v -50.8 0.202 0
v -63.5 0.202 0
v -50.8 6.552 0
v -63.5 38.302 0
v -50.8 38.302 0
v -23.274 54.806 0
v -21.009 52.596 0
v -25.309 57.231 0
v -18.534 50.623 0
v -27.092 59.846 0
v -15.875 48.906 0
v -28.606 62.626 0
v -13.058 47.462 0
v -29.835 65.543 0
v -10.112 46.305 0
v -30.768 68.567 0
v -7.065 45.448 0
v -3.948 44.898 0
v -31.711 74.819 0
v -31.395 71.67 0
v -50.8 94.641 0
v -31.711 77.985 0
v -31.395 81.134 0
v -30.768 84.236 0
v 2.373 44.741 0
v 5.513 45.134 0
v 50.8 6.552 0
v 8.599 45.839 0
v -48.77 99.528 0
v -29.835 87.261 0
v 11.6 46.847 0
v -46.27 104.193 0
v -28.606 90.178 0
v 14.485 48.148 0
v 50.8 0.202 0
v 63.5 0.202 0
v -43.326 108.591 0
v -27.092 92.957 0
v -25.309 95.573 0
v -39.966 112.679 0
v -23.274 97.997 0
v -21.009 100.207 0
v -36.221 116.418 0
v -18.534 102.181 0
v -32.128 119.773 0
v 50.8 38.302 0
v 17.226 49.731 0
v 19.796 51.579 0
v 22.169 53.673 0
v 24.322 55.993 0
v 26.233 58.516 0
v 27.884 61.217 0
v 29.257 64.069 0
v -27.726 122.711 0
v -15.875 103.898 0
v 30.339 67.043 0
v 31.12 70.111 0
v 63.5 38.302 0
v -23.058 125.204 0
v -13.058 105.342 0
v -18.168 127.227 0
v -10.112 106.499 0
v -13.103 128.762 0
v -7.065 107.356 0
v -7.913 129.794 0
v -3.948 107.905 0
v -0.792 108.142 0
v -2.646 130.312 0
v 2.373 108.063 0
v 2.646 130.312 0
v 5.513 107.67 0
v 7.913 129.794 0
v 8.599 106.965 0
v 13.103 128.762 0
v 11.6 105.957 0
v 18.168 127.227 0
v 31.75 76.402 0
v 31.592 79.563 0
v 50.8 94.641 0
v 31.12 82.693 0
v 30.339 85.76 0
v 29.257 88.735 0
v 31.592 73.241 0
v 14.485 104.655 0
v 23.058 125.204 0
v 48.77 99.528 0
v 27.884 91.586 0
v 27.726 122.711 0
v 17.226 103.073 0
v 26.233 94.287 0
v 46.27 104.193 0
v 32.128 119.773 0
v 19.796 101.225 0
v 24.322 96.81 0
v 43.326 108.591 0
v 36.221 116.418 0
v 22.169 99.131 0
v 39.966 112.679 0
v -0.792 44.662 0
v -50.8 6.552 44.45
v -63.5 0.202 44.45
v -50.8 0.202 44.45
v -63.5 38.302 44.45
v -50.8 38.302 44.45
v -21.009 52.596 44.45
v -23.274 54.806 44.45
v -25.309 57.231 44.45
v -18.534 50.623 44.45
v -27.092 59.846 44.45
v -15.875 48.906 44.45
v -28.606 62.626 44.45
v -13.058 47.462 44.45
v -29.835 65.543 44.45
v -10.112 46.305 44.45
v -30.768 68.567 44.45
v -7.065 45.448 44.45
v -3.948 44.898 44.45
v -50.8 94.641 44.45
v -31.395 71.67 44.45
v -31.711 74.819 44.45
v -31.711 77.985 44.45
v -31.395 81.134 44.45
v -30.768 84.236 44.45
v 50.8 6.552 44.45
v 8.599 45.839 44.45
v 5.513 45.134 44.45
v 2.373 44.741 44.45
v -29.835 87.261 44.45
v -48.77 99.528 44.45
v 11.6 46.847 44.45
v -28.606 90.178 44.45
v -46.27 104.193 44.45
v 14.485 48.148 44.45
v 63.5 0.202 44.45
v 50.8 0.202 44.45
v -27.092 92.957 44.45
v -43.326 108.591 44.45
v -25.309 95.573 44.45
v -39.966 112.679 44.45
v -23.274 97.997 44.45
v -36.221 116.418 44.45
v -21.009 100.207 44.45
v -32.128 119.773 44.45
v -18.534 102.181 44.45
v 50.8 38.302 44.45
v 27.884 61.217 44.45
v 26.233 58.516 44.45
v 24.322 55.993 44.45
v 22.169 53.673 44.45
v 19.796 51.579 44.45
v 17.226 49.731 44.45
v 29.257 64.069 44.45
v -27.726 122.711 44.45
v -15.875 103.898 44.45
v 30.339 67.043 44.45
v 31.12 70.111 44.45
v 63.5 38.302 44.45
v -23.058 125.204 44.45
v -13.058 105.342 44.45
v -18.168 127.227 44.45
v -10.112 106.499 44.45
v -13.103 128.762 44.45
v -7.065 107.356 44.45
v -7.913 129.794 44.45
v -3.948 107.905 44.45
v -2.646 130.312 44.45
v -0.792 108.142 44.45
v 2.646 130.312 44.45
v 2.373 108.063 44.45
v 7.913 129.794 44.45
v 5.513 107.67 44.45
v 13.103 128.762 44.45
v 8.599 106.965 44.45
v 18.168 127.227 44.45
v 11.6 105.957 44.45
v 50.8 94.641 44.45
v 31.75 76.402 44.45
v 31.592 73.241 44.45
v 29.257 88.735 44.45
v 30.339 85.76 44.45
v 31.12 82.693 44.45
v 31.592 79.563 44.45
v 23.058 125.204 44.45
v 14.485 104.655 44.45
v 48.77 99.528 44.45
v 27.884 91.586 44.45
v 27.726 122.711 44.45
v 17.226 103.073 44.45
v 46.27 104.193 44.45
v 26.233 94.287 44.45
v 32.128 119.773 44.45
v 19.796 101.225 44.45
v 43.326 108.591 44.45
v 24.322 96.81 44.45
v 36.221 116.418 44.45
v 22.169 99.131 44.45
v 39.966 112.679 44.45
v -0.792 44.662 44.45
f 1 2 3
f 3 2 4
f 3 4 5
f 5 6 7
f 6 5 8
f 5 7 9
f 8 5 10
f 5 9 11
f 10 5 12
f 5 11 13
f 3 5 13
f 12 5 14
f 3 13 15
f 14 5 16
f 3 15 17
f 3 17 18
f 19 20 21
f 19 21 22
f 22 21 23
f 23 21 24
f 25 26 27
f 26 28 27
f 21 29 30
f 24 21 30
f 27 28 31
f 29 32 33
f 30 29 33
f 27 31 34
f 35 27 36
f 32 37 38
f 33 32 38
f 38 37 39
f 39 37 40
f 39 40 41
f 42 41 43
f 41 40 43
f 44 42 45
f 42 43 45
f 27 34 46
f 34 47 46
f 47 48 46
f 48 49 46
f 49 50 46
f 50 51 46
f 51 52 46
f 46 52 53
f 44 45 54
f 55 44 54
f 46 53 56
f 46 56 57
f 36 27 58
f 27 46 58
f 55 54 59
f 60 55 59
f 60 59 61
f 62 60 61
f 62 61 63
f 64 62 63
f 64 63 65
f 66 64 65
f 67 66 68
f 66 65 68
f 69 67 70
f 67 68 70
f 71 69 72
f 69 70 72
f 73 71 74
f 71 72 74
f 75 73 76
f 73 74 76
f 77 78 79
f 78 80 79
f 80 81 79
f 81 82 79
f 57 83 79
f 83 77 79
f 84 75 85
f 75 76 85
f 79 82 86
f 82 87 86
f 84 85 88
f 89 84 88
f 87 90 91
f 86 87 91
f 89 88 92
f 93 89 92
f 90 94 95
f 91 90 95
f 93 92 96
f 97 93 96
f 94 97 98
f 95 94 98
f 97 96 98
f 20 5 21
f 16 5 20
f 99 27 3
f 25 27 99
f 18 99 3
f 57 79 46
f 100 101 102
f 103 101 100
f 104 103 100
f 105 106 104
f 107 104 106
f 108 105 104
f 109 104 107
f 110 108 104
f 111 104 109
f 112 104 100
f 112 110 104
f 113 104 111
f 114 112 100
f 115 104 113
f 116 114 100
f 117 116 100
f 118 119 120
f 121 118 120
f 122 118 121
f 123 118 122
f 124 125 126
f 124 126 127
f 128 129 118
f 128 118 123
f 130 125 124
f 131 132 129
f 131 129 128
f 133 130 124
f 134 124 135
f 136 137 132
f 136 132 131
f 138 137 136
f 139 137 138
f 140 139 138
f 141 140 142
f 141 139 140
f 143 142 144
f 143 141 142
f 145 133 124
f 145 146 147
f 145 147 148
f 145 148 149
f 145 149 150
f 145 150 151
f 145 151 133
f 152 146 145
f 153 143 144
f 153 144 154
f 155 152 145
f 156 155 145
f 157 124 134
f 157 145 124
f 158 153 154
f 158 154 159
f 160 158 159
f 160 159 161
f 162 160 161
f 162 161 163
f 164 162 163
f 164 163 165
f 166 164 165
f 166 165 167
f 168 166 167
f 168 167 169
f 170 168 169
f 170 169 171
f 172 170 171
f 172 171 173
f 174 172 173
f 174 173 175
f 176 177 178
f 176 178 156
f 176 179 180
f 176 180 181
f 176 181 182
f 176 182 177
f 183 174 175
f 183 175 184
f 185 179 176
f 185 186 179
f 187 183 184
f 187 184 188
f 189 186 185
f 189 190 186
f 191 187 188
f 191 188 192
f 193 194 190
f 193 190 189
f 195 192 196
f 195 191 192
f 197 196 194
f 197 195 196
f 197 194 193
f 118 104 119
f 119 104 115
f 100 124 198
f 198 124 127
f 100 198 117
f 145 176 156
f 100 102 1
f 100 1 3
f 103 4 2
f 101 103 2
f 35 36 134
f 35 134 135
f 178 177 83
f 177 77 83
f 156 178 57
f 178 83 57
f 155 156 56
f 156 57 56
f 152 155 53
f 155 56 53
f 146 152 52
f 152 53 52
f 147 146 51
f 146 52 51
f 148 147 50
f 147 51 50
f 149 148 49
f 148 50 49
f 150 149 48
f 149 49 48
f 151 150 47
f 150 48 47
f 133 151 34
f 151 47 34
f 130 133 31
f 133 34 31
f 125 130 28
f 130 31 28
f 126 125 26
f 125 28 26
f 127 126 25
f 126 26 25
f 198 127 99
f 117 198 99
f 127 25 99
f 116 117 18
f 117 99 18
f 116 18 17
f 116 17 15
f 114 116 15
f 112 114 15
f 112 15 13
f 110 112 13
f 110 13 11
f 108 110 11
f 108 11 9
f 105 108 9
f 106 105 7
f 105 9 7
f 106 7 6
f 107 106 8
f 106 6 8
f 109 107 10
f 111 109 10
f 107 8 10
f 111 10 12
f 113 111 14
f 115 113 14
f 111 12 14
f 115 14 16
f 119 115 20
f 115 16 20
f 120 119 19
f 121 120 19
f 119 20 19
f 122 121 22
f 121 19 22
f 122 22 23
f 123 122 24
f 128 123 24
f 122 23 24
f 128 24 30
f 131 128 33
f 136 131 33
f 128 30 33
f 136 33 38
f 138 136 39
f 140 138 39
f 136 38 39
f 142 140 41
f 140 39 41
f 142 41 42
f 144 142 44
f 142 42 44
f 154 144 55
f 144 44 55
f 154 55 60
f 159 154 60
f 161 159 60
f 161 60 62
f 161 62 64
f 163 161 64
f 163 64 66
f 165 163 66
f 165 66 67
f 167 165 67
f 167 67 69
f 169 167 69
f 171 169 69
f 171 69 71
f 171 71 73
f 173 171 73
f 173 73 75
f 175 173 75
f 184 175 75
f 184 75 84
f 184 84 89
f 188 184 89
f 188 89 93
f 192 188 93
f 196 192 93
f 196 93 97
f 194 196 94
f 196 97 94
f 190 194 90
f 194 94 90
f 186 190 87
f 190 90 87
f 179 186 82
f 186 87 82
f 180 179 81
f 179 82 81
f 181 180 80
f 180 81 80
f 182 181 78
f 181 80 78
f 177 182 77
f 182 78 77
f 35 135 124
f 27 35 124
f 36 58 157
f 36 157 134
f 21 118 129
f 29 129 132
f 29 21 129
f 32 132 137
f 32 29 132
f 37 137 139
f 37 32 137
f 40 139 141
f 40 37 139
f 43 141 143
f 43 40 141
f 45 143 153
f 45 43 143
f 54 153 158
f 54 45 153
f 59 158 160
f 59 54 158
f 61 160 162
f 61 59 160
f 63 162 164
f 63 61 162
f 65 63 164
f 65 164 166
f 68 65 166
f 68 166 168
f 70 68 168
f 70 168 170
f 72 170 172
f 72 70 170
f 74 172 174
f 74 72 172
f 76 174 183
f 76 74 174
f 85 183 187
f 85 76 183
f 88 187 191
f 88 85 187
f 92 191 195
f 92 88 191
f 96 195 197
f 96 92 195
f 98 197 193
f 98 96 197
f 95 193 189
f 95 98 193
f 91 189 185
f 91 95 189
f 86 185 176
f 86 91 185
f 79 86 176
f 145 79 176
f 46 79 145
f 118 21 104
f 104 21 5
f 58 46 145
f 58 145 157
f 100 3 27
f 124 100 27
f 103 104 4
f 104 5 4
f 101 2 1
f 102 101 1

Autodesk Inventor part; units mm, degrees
ref_plane "YZ Plane" through (0, 0, 0) normal (1, 0, 0) x (0, 1, 0)
ref_plane "XZ Plane" through (0, 0, 0) normal (0, 1, 0) x (-1, 0, 0)
ref_plane "XY Plane" through (0, 0, 0) normal (0, 0, 1) x (1, 0, 0)
sketch "Sketch1" plane through (0, 0, 0) normal (0, 0, 1) x (1, 0, 0)
  line L0 (0, 0) -> (0, 152.8038)
  line L1 (-50.8, 94.6409) -> (-50.8, 38.3019)
  line L2 (-50.8, 38.3019) -> (-63.5, 38.3019)
  line L3 (-63.5, 38.3019) -> (-63.5, 0.2019)
  line L4 (-63.5, 0.2019) -> (-50.8, 0.2019)
  line L5 (-50.8, 0.2019) -> (-50.8, 6.5519)
  line L6 (-50.8, 6.5519) -> (0, 6.5519)
  line L7 (50.8, 94.6409) -> (50.8, 38.3019)
  line L8 (50.8, 38.3019) -> (63.5, 38.3019)
  line L9 (63.5, 38.3019) -> (63.5, 0.2019)
  line L10 (63.5, 0.2019) -> (50.8, 0.2019)
  line L11 (50.8, 0.2019) -> (50.8, 6.5519)
  line L12 (50.8, 6.5519) -> (0, 6.5519)
  circle A0 centre (0, 76.4019) radius 31.75
  arc A1 (50.8, 94.6409) -> (-50.8, 94.6409) centre (0, 76.4019) ccw
  dimension "d9" = 63.5
  dimension "d10" = 76.2
  dimension "d11" = 101.6
  dimension "d12" = 12.7
  dimension "d13" = 6.35
  dimension "d14" = 38.1
  dimension "d15" = 53.975
extrude "Extrusion1" add sketch "Sketch1" along normal blind 44.45 contours L6 L5 L4 L3 L2 L1 A1 L0 A0 | L0 A0 A1 L7 L8 L9 L10 L11 L12
properties part number "GuideSlider" material "Iron, Cast"
